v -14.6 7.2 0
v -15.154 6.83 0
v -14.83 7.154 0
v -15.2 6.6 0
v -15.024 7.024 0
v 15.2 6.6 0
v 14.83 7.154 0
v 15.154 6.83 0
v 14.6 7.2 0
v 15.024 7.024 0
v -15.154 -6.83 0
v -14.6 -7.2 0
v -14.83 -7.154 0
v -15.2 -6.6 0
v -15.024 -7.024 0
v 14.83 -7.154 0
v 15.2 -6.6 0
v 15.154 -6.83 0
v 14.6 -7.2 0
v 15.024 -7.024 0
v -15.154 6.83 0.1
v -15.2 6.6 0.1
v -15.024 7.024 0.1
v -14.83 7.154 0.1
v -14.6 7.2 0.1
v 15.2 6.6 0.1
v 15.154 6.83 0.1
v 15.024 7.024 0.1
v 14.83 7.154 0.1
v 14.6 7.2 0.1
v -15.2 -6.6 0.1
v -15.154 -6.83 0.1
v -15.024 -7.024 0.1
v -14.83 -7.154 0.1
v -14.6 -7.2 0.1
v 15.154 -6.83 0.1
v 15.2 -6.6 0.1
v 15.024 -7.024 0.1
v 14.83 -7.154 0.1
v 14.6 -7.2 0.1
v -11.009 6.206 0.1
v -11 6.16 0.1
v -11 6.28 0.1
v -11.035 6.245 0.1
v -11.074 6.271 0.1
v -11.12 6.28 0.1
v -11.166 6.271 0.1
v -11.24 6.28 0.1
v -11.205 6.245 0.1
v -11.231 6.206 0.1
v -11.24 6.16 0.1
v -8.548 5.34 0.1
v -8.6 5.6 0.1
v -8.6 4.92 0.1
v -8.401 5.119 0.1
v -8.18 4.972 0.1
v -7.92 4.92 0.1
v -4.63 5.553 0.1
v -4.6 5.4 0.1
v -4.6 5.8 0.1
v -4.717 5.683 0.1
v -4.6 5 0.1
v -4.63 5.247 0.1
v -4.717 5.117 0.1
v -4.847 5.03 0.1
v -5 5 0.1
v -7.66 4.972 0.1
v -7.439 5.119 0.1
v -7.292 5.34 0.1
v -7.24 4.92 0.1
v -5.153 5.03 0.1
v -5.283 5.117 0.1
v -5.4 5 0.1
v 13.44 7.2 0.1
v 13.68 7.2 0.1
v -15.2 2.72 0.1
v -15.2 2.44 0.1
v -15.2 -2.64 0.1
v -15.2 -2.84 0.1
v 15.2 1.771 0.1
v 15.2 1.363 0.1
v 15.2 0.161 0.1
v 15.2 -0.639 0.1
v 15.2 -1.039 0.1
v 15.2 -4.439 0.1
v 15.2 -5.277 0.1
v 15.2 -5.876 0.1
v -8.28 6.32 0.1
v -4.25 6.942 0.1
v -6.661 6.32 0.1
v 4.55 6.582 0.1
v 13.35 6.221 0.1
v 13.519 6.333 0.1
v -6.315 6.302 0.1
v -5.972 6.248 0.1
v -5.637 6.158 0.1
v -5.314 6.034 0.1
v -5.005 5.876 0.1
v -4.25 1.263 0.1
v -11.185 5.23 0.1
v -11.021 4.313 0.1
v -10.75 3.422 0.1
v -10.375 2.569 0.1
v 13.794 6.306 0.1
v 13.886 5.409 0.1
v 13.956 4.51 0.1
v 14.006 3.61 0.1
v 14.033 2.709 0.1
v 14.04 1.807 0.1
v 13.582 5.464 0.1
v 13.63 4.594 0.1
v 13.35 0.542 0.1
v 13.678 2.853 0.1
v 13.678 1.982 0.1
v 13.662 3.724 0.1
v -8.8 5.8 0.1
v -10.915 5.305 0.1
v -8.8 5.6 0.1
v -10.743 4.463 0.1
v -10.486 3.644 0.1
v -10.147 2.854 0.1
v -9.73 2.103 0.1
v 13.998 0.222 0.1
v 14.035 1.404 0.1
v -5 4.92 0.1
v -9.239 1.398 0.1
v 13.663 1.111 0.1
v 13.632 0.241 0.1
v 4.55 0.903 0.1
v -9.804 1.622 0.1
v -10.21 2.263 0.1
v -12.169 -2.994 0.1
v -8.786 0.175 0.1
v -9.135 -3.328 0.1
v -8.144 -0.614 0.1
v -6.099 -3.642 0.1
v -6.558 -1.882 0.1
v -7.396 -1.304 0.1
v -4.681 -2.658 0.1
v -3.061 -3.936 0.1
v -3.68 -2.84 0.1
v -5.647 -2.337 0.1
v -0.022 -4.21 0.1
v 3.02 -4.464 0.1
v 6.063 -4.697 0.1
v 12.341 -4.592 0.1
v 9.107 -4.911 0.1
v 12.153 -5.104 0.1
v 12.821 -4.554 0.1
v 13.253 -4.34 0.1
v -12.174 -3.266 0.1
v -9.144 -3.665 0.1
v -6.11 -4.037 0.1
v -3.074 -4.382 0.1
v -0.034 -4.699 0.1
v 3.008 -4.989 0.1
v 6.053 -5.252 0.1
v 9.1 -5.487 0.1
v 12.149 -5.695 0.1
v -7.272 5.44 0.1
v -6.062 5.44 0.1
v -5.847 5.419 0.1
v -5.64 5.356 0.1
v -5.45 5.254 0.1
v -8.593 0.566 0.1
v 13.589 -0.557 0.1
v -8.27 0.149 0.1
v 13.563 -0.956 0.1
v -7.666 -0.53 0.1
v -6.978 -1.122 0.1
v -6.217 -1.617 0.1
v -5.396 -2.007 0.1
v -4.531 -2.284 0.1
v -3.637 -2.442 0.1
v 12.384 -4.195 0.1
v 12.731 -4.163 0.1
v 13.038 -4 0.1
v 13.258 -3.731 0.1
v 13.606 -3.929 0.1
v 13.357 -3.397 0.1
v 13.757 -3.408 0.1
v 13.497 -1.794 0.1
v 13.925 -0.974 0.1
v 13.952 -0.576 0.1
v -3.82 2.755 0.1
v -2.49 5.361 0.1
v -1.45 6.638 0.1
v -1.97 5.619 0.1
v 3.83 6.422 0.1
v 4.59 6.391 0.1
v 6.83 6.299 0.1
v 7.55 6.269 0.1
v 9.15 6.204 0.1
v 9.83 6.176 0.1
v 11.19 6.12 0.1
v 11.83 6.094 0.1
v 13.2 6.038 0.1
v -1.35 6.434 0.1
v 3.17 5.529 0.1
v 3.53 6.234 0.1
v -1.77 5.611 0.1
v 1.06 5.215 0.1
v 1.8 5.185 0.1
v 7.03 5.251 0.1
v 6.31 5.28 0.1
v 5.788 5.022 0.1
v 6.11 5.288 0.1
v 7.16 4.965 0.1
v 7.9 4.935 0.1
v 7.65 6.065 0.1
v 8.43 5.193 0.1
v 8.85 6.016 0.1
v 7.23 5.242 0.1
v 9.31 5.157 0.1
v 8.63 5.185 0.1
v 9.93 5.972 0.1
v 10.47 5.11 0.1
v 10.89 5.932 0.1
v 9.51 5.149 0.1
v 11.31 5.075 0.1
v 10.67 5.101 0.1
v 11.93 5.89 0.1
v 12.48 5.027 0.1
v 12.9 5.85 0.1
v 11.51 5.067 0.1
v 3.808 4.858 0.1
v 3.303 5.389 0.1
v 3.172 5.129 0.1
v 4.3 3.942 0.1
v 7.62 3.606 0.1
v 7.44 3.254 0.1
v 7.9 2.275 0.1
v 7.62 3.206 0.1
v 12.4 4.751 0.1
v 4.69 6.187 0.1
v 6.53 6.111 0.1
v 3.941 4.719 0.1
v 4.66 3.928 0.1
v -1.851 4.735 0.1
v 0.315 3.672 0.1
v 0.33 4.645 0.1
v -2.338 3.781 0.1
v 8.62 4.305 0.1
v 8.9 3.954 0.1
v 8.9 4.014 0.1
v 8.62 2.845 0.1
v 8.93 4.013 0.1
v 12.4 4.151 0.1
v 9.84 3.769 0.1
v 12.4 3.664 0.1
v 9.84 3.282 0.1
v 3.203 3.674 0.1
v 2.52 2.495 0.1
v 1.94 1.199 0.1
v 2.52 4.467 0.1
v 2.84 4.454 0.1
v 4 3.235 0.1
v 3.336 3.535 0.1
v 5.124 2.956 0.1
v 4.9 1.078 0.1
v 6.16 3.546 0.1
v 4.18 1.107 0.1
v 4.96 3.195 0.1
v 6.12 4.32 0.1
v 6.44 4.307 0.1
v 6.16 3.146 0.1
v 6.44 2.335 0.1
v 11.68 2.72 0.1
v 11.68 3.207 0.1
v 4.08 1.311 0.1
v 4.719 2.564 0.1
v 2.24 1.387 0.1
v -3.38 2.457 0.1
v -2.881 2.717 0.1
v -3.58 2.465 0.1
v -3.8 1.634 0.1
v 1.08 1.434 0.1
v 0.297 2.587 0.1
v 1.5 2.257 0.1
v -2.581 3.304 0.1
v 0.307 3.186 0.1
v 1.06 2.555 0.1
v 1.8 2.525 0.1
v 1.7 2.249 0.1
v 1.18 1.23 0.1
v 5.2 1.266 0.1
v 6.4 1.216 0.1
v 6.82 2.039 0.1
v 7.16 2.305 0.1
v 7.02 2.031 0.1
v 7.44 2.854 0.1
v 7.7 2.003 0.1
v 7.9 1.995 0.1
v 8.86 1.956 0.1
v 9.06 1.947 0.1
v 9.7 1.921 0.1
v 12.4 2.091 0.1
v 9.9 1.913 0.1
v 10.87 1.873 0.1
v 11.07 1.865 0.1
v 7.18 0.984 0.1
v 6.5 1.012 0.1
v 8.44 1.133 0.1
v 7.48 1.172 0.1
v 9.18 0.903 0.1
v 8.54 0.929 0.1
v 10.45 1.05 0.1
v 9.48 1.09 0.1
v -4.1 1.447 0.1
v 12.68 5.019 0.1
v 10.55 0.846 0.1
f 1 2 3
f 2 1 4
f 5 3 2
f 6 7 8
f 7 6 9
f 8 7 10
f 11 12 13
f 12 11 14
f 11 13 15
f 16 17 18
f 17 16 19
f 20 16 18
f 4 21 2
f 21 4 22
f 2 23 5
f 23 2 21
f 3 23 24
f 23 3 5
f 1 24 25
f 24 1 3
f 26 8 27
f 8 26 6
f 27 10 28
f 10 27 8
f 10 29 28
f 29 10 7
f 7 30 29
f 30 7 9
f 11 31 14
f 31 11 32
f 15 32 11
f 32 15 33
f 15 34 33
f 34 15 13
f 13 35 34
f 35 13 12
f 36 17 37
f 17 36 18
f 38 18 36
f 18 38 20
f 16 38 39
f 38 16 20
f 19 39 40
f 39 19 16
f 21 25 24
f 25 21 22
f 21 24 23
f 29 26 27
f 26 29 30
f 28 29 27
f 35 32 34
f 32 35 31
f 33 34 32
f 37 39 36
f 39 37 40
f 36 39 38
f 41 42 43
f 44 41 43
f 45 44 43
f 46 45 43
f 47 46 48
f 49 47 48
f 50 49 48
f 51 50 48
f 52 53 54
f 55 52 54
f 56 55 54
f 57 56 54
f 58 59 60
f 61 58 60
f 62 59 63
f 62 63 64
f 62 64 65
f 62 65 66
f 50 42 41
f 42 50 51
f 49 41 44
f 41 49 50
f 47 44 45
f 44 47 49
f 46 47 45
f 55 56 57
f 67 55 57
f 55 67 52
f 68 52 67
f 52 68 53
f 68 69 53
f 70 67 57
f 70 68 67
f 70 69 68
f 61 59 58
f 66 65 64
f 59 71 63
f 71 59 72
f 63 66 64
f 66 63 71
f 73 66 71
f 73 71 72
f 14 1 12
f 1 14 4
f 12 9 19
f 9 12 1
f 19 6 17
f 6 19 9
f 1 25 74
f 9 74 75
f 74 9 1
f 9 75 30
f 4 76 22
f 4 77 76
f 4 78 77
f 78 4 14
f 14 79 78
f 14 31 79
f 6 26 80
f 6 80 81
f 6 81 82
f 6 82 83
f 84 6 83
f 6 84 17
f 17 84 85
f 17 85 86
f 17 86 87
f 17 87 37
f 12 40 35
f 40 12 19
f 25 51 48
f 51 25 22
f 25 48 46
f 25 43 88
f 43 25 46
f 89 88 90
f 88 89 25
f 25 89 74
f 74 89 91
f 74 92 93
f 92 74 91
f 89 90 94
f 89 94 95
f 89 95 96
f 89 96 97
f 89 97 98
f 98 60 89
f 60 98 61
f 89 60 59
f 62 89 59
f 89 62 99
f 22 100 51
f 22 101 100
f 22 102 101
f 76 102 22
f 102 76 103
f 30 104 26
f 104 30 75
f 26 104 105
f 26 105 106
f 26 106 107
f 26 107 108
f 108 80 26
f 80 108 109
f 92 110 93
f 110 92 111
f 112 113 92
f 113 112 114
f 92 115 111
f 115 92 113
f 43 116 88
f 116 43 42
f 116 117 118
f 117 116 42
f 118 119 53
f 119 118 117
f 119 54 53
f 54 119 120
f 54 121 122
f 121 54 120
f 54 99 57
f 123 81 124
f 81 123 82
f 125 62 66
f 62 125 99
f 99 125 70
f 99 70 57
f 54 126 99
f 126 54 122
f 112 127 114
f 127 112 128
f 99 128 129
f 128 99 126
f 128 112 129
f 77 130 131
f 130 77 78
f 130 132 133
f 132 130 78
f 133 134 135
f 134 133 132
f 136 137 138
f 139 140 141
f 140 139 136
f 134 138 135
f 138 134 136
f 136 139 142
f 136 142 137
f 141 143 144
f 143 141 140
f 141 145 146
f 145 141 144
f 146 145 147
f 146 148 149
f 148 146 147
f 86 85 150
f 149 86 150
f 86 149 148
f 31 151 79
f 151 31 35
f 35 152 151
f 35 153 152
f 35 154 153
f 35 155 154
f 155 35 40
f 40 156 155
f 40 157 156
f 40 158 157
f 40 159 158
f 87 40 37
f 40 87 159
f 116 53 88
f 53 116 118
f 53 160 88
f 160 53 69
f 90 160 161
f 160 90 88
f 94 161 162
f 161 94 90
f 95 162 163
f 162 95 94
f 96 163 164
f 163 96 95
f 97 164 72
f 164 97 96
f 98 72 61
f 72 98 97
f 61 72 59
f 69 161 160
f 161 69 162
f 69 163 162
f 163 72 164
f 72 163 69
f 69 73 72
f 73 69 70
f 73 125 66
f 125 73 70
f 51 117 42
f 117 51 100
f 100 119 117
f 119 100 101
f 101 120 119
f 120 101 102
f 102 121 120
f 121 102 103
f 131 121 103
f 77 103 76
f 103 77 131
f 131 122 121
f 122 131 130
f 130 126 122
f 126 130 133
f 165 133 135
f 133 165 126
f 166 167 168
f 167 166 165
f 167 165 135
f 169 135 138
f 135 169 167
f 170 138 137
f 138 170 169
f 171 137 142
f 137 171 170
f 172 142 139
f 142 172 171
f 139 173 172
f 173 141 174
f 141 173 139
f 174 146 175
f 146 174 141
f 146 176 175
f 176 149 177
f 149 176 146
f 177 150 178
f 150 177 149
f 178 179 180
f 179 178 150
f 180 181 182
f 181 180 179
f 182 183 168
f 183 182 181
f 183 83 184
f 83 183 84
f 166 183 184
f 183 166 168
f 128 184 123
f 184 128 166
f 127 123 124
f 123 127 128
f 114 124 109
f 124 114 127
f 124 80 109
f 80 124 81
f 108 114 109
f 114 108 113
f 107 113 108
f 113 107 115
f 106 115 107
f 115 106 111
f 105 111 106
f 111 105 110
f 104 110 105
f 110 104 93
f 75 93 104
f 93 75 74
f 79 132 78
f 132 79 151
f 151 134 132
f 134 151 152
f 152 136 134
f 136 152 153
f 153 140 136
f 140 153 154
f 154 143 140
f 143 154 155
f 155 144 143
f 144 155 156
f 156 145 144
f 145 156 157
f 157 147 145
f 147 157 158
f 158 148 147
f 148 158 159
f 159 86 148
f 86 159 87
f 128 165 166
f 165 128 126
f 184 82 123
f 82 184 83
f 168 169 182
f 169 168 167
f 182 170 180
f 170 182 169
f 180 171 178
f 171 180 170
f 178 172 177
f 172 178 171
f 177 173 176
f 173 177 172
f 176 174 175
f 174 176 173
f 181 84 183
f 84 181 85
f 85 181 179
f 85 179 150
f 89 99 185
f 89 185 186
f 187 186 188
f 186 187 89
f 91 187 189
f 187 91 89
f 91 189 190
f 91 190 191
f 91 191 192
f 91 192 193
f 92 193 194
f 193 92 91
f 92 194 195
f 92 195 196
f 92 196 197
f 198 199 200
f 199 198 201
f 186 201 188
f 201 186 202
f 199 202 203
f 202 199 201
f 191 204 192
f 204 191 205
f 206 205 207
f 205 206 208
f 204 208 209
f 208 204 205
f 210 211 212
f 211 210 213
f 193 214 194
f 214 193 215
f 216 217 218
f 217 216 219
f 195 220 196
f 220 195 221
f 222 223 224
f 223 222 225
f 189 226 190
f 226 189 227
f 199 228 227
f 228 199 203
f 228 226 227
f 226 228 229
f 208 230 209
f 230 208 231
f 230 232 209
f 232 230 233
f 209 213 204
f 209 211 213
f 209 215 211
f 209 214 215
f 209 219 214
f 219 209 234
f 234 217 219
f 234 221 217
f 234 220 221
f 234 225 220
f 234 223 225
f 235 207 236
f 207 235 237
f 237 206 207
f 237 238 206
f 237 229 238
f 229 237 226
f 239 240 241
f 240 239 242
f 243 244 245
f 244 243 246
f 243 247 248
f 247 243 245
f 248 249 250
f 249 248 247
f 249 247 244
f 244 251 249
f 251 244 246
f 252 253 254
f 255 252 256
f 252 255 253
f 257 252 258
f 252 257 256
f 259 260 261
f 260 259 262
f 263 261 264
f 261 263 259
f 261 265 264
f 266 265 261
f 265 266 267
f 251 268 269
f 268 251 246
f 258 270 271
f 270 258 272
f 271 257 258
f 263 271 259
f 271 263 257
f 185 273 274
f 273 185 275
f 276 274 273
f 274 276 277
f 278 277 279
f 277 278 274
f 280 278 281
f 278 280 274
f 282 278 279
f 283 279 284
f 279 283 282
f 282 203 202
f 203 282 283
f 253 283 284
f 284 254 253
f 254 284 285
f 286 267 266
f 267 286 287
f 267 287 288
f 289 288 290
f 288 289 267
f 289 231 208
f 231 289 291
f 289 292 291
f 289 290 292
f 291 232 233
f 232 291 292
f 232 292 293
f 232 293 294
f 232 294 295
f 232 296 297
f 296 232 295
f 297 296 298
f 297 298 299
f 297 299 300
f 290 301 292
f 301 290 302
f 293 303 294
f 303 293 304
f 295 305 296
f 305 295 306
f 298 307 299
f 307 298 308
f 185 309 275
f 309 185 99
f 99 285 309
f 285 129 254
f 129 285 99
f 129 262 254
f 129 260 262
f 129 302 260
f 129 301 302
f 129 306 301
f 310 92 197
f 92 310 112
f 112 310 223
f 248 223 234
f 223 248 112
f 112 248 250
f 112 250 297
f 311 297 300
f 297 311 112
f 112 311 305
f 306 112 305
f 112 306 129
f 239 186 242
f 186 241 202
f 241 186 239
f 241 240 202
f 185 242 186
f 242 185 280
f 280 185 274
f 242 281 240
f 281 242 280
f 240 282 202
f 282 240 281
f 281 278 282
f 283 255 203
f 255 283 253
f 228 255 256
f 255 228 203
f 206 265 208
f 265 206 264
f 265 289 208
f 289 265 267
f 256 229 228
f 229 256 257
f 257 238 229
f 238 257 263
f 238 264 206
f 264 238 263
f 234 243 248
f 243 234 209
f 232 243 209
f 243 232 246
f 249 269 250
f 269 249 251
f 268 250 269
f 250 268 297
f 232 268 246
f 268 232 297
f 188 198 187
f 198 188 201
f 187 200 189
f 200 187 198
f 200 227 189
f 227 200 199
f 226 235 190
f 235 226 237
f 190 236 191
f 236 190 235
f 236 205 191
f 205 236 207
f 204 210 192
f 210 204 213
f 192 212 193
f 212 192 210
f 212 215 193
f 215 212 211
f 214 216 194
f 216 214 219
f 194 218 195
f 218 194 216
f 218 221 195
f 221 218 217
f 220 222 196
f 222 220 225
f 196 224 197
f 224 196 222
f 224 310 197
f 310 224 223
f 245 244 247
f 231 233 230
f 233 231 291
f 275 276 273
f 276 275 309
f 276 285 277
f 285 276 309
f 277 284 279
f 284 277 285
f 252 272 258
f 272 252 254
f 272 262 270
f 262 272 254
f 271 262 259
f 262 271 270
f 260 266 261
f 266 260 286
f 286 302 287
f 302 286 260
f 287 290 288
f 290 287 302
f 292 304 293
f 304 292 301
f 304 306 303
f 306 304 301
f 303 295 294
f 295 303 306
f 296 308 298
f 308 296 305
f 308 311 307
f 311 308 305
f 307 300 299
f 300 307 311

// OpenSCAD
use <../lib.scad>
use <s/6177741js01.scad>
use <s/6177741js02.scad>
function ldraw_lib__6177741j() = [
// 0 Sticker  1.8 x  3.8 with Door Outline with Yellow Stripes and White AMG Logo on Transparent Background Right (Needs Work)
// 0 Name: 6177741j.dat
// 0 Author: Massimo Maso [Sirio]
// 0 !LDRAW_ORG Part UPDATE 2025-05
// 0 !LICENSE Licensed under CC BY 4.0 : see CAreadme.txt
// 
// 0 !HELP Needs work: halftone areas are simplified because no high-resolution images are available
// 
// 0 BFC CERTIFY CCW
  [0,"BFC","CERTIFY"],
  [0,"BFC","CCW"],
// 
// 0 !KEYWORDS GT3, Mercedes, Set 75877, Speed Champions
// 
// 0 !HISTORY 2025-05-28 [OrionP] Official Update 2025-05
// 
// 
// 1 16 0 0 0 1 0 0 0 1 0 0 0 1 s\6177741js01.dat
  [1,16,0,0,0,1,0,0,0,1,0,0,0,1, ldraw_lib__s__6177741js01()],
// 1 16 11.3750 -.25 9.3556 1 0 0 0 1 0 -0.040976 0 1 s\6177741js02.dat
  [1,16,11.3750,-.25,9.3556,1,0,0,0,1,0,-0.040976,0,1, ldraw_lib__s__6177741js02()],
];
module ldraw_lib__6177741j(step=0, col=false, unit=2/5, alt=false, line=0.2, solid=!$preview)
    makepoly(ldraw_lib__6177741j(), step=step, col=col, unit=unit, alt=alt, line=line, solid=solid);
ldraw_lib__6177741j(line=0.2);
